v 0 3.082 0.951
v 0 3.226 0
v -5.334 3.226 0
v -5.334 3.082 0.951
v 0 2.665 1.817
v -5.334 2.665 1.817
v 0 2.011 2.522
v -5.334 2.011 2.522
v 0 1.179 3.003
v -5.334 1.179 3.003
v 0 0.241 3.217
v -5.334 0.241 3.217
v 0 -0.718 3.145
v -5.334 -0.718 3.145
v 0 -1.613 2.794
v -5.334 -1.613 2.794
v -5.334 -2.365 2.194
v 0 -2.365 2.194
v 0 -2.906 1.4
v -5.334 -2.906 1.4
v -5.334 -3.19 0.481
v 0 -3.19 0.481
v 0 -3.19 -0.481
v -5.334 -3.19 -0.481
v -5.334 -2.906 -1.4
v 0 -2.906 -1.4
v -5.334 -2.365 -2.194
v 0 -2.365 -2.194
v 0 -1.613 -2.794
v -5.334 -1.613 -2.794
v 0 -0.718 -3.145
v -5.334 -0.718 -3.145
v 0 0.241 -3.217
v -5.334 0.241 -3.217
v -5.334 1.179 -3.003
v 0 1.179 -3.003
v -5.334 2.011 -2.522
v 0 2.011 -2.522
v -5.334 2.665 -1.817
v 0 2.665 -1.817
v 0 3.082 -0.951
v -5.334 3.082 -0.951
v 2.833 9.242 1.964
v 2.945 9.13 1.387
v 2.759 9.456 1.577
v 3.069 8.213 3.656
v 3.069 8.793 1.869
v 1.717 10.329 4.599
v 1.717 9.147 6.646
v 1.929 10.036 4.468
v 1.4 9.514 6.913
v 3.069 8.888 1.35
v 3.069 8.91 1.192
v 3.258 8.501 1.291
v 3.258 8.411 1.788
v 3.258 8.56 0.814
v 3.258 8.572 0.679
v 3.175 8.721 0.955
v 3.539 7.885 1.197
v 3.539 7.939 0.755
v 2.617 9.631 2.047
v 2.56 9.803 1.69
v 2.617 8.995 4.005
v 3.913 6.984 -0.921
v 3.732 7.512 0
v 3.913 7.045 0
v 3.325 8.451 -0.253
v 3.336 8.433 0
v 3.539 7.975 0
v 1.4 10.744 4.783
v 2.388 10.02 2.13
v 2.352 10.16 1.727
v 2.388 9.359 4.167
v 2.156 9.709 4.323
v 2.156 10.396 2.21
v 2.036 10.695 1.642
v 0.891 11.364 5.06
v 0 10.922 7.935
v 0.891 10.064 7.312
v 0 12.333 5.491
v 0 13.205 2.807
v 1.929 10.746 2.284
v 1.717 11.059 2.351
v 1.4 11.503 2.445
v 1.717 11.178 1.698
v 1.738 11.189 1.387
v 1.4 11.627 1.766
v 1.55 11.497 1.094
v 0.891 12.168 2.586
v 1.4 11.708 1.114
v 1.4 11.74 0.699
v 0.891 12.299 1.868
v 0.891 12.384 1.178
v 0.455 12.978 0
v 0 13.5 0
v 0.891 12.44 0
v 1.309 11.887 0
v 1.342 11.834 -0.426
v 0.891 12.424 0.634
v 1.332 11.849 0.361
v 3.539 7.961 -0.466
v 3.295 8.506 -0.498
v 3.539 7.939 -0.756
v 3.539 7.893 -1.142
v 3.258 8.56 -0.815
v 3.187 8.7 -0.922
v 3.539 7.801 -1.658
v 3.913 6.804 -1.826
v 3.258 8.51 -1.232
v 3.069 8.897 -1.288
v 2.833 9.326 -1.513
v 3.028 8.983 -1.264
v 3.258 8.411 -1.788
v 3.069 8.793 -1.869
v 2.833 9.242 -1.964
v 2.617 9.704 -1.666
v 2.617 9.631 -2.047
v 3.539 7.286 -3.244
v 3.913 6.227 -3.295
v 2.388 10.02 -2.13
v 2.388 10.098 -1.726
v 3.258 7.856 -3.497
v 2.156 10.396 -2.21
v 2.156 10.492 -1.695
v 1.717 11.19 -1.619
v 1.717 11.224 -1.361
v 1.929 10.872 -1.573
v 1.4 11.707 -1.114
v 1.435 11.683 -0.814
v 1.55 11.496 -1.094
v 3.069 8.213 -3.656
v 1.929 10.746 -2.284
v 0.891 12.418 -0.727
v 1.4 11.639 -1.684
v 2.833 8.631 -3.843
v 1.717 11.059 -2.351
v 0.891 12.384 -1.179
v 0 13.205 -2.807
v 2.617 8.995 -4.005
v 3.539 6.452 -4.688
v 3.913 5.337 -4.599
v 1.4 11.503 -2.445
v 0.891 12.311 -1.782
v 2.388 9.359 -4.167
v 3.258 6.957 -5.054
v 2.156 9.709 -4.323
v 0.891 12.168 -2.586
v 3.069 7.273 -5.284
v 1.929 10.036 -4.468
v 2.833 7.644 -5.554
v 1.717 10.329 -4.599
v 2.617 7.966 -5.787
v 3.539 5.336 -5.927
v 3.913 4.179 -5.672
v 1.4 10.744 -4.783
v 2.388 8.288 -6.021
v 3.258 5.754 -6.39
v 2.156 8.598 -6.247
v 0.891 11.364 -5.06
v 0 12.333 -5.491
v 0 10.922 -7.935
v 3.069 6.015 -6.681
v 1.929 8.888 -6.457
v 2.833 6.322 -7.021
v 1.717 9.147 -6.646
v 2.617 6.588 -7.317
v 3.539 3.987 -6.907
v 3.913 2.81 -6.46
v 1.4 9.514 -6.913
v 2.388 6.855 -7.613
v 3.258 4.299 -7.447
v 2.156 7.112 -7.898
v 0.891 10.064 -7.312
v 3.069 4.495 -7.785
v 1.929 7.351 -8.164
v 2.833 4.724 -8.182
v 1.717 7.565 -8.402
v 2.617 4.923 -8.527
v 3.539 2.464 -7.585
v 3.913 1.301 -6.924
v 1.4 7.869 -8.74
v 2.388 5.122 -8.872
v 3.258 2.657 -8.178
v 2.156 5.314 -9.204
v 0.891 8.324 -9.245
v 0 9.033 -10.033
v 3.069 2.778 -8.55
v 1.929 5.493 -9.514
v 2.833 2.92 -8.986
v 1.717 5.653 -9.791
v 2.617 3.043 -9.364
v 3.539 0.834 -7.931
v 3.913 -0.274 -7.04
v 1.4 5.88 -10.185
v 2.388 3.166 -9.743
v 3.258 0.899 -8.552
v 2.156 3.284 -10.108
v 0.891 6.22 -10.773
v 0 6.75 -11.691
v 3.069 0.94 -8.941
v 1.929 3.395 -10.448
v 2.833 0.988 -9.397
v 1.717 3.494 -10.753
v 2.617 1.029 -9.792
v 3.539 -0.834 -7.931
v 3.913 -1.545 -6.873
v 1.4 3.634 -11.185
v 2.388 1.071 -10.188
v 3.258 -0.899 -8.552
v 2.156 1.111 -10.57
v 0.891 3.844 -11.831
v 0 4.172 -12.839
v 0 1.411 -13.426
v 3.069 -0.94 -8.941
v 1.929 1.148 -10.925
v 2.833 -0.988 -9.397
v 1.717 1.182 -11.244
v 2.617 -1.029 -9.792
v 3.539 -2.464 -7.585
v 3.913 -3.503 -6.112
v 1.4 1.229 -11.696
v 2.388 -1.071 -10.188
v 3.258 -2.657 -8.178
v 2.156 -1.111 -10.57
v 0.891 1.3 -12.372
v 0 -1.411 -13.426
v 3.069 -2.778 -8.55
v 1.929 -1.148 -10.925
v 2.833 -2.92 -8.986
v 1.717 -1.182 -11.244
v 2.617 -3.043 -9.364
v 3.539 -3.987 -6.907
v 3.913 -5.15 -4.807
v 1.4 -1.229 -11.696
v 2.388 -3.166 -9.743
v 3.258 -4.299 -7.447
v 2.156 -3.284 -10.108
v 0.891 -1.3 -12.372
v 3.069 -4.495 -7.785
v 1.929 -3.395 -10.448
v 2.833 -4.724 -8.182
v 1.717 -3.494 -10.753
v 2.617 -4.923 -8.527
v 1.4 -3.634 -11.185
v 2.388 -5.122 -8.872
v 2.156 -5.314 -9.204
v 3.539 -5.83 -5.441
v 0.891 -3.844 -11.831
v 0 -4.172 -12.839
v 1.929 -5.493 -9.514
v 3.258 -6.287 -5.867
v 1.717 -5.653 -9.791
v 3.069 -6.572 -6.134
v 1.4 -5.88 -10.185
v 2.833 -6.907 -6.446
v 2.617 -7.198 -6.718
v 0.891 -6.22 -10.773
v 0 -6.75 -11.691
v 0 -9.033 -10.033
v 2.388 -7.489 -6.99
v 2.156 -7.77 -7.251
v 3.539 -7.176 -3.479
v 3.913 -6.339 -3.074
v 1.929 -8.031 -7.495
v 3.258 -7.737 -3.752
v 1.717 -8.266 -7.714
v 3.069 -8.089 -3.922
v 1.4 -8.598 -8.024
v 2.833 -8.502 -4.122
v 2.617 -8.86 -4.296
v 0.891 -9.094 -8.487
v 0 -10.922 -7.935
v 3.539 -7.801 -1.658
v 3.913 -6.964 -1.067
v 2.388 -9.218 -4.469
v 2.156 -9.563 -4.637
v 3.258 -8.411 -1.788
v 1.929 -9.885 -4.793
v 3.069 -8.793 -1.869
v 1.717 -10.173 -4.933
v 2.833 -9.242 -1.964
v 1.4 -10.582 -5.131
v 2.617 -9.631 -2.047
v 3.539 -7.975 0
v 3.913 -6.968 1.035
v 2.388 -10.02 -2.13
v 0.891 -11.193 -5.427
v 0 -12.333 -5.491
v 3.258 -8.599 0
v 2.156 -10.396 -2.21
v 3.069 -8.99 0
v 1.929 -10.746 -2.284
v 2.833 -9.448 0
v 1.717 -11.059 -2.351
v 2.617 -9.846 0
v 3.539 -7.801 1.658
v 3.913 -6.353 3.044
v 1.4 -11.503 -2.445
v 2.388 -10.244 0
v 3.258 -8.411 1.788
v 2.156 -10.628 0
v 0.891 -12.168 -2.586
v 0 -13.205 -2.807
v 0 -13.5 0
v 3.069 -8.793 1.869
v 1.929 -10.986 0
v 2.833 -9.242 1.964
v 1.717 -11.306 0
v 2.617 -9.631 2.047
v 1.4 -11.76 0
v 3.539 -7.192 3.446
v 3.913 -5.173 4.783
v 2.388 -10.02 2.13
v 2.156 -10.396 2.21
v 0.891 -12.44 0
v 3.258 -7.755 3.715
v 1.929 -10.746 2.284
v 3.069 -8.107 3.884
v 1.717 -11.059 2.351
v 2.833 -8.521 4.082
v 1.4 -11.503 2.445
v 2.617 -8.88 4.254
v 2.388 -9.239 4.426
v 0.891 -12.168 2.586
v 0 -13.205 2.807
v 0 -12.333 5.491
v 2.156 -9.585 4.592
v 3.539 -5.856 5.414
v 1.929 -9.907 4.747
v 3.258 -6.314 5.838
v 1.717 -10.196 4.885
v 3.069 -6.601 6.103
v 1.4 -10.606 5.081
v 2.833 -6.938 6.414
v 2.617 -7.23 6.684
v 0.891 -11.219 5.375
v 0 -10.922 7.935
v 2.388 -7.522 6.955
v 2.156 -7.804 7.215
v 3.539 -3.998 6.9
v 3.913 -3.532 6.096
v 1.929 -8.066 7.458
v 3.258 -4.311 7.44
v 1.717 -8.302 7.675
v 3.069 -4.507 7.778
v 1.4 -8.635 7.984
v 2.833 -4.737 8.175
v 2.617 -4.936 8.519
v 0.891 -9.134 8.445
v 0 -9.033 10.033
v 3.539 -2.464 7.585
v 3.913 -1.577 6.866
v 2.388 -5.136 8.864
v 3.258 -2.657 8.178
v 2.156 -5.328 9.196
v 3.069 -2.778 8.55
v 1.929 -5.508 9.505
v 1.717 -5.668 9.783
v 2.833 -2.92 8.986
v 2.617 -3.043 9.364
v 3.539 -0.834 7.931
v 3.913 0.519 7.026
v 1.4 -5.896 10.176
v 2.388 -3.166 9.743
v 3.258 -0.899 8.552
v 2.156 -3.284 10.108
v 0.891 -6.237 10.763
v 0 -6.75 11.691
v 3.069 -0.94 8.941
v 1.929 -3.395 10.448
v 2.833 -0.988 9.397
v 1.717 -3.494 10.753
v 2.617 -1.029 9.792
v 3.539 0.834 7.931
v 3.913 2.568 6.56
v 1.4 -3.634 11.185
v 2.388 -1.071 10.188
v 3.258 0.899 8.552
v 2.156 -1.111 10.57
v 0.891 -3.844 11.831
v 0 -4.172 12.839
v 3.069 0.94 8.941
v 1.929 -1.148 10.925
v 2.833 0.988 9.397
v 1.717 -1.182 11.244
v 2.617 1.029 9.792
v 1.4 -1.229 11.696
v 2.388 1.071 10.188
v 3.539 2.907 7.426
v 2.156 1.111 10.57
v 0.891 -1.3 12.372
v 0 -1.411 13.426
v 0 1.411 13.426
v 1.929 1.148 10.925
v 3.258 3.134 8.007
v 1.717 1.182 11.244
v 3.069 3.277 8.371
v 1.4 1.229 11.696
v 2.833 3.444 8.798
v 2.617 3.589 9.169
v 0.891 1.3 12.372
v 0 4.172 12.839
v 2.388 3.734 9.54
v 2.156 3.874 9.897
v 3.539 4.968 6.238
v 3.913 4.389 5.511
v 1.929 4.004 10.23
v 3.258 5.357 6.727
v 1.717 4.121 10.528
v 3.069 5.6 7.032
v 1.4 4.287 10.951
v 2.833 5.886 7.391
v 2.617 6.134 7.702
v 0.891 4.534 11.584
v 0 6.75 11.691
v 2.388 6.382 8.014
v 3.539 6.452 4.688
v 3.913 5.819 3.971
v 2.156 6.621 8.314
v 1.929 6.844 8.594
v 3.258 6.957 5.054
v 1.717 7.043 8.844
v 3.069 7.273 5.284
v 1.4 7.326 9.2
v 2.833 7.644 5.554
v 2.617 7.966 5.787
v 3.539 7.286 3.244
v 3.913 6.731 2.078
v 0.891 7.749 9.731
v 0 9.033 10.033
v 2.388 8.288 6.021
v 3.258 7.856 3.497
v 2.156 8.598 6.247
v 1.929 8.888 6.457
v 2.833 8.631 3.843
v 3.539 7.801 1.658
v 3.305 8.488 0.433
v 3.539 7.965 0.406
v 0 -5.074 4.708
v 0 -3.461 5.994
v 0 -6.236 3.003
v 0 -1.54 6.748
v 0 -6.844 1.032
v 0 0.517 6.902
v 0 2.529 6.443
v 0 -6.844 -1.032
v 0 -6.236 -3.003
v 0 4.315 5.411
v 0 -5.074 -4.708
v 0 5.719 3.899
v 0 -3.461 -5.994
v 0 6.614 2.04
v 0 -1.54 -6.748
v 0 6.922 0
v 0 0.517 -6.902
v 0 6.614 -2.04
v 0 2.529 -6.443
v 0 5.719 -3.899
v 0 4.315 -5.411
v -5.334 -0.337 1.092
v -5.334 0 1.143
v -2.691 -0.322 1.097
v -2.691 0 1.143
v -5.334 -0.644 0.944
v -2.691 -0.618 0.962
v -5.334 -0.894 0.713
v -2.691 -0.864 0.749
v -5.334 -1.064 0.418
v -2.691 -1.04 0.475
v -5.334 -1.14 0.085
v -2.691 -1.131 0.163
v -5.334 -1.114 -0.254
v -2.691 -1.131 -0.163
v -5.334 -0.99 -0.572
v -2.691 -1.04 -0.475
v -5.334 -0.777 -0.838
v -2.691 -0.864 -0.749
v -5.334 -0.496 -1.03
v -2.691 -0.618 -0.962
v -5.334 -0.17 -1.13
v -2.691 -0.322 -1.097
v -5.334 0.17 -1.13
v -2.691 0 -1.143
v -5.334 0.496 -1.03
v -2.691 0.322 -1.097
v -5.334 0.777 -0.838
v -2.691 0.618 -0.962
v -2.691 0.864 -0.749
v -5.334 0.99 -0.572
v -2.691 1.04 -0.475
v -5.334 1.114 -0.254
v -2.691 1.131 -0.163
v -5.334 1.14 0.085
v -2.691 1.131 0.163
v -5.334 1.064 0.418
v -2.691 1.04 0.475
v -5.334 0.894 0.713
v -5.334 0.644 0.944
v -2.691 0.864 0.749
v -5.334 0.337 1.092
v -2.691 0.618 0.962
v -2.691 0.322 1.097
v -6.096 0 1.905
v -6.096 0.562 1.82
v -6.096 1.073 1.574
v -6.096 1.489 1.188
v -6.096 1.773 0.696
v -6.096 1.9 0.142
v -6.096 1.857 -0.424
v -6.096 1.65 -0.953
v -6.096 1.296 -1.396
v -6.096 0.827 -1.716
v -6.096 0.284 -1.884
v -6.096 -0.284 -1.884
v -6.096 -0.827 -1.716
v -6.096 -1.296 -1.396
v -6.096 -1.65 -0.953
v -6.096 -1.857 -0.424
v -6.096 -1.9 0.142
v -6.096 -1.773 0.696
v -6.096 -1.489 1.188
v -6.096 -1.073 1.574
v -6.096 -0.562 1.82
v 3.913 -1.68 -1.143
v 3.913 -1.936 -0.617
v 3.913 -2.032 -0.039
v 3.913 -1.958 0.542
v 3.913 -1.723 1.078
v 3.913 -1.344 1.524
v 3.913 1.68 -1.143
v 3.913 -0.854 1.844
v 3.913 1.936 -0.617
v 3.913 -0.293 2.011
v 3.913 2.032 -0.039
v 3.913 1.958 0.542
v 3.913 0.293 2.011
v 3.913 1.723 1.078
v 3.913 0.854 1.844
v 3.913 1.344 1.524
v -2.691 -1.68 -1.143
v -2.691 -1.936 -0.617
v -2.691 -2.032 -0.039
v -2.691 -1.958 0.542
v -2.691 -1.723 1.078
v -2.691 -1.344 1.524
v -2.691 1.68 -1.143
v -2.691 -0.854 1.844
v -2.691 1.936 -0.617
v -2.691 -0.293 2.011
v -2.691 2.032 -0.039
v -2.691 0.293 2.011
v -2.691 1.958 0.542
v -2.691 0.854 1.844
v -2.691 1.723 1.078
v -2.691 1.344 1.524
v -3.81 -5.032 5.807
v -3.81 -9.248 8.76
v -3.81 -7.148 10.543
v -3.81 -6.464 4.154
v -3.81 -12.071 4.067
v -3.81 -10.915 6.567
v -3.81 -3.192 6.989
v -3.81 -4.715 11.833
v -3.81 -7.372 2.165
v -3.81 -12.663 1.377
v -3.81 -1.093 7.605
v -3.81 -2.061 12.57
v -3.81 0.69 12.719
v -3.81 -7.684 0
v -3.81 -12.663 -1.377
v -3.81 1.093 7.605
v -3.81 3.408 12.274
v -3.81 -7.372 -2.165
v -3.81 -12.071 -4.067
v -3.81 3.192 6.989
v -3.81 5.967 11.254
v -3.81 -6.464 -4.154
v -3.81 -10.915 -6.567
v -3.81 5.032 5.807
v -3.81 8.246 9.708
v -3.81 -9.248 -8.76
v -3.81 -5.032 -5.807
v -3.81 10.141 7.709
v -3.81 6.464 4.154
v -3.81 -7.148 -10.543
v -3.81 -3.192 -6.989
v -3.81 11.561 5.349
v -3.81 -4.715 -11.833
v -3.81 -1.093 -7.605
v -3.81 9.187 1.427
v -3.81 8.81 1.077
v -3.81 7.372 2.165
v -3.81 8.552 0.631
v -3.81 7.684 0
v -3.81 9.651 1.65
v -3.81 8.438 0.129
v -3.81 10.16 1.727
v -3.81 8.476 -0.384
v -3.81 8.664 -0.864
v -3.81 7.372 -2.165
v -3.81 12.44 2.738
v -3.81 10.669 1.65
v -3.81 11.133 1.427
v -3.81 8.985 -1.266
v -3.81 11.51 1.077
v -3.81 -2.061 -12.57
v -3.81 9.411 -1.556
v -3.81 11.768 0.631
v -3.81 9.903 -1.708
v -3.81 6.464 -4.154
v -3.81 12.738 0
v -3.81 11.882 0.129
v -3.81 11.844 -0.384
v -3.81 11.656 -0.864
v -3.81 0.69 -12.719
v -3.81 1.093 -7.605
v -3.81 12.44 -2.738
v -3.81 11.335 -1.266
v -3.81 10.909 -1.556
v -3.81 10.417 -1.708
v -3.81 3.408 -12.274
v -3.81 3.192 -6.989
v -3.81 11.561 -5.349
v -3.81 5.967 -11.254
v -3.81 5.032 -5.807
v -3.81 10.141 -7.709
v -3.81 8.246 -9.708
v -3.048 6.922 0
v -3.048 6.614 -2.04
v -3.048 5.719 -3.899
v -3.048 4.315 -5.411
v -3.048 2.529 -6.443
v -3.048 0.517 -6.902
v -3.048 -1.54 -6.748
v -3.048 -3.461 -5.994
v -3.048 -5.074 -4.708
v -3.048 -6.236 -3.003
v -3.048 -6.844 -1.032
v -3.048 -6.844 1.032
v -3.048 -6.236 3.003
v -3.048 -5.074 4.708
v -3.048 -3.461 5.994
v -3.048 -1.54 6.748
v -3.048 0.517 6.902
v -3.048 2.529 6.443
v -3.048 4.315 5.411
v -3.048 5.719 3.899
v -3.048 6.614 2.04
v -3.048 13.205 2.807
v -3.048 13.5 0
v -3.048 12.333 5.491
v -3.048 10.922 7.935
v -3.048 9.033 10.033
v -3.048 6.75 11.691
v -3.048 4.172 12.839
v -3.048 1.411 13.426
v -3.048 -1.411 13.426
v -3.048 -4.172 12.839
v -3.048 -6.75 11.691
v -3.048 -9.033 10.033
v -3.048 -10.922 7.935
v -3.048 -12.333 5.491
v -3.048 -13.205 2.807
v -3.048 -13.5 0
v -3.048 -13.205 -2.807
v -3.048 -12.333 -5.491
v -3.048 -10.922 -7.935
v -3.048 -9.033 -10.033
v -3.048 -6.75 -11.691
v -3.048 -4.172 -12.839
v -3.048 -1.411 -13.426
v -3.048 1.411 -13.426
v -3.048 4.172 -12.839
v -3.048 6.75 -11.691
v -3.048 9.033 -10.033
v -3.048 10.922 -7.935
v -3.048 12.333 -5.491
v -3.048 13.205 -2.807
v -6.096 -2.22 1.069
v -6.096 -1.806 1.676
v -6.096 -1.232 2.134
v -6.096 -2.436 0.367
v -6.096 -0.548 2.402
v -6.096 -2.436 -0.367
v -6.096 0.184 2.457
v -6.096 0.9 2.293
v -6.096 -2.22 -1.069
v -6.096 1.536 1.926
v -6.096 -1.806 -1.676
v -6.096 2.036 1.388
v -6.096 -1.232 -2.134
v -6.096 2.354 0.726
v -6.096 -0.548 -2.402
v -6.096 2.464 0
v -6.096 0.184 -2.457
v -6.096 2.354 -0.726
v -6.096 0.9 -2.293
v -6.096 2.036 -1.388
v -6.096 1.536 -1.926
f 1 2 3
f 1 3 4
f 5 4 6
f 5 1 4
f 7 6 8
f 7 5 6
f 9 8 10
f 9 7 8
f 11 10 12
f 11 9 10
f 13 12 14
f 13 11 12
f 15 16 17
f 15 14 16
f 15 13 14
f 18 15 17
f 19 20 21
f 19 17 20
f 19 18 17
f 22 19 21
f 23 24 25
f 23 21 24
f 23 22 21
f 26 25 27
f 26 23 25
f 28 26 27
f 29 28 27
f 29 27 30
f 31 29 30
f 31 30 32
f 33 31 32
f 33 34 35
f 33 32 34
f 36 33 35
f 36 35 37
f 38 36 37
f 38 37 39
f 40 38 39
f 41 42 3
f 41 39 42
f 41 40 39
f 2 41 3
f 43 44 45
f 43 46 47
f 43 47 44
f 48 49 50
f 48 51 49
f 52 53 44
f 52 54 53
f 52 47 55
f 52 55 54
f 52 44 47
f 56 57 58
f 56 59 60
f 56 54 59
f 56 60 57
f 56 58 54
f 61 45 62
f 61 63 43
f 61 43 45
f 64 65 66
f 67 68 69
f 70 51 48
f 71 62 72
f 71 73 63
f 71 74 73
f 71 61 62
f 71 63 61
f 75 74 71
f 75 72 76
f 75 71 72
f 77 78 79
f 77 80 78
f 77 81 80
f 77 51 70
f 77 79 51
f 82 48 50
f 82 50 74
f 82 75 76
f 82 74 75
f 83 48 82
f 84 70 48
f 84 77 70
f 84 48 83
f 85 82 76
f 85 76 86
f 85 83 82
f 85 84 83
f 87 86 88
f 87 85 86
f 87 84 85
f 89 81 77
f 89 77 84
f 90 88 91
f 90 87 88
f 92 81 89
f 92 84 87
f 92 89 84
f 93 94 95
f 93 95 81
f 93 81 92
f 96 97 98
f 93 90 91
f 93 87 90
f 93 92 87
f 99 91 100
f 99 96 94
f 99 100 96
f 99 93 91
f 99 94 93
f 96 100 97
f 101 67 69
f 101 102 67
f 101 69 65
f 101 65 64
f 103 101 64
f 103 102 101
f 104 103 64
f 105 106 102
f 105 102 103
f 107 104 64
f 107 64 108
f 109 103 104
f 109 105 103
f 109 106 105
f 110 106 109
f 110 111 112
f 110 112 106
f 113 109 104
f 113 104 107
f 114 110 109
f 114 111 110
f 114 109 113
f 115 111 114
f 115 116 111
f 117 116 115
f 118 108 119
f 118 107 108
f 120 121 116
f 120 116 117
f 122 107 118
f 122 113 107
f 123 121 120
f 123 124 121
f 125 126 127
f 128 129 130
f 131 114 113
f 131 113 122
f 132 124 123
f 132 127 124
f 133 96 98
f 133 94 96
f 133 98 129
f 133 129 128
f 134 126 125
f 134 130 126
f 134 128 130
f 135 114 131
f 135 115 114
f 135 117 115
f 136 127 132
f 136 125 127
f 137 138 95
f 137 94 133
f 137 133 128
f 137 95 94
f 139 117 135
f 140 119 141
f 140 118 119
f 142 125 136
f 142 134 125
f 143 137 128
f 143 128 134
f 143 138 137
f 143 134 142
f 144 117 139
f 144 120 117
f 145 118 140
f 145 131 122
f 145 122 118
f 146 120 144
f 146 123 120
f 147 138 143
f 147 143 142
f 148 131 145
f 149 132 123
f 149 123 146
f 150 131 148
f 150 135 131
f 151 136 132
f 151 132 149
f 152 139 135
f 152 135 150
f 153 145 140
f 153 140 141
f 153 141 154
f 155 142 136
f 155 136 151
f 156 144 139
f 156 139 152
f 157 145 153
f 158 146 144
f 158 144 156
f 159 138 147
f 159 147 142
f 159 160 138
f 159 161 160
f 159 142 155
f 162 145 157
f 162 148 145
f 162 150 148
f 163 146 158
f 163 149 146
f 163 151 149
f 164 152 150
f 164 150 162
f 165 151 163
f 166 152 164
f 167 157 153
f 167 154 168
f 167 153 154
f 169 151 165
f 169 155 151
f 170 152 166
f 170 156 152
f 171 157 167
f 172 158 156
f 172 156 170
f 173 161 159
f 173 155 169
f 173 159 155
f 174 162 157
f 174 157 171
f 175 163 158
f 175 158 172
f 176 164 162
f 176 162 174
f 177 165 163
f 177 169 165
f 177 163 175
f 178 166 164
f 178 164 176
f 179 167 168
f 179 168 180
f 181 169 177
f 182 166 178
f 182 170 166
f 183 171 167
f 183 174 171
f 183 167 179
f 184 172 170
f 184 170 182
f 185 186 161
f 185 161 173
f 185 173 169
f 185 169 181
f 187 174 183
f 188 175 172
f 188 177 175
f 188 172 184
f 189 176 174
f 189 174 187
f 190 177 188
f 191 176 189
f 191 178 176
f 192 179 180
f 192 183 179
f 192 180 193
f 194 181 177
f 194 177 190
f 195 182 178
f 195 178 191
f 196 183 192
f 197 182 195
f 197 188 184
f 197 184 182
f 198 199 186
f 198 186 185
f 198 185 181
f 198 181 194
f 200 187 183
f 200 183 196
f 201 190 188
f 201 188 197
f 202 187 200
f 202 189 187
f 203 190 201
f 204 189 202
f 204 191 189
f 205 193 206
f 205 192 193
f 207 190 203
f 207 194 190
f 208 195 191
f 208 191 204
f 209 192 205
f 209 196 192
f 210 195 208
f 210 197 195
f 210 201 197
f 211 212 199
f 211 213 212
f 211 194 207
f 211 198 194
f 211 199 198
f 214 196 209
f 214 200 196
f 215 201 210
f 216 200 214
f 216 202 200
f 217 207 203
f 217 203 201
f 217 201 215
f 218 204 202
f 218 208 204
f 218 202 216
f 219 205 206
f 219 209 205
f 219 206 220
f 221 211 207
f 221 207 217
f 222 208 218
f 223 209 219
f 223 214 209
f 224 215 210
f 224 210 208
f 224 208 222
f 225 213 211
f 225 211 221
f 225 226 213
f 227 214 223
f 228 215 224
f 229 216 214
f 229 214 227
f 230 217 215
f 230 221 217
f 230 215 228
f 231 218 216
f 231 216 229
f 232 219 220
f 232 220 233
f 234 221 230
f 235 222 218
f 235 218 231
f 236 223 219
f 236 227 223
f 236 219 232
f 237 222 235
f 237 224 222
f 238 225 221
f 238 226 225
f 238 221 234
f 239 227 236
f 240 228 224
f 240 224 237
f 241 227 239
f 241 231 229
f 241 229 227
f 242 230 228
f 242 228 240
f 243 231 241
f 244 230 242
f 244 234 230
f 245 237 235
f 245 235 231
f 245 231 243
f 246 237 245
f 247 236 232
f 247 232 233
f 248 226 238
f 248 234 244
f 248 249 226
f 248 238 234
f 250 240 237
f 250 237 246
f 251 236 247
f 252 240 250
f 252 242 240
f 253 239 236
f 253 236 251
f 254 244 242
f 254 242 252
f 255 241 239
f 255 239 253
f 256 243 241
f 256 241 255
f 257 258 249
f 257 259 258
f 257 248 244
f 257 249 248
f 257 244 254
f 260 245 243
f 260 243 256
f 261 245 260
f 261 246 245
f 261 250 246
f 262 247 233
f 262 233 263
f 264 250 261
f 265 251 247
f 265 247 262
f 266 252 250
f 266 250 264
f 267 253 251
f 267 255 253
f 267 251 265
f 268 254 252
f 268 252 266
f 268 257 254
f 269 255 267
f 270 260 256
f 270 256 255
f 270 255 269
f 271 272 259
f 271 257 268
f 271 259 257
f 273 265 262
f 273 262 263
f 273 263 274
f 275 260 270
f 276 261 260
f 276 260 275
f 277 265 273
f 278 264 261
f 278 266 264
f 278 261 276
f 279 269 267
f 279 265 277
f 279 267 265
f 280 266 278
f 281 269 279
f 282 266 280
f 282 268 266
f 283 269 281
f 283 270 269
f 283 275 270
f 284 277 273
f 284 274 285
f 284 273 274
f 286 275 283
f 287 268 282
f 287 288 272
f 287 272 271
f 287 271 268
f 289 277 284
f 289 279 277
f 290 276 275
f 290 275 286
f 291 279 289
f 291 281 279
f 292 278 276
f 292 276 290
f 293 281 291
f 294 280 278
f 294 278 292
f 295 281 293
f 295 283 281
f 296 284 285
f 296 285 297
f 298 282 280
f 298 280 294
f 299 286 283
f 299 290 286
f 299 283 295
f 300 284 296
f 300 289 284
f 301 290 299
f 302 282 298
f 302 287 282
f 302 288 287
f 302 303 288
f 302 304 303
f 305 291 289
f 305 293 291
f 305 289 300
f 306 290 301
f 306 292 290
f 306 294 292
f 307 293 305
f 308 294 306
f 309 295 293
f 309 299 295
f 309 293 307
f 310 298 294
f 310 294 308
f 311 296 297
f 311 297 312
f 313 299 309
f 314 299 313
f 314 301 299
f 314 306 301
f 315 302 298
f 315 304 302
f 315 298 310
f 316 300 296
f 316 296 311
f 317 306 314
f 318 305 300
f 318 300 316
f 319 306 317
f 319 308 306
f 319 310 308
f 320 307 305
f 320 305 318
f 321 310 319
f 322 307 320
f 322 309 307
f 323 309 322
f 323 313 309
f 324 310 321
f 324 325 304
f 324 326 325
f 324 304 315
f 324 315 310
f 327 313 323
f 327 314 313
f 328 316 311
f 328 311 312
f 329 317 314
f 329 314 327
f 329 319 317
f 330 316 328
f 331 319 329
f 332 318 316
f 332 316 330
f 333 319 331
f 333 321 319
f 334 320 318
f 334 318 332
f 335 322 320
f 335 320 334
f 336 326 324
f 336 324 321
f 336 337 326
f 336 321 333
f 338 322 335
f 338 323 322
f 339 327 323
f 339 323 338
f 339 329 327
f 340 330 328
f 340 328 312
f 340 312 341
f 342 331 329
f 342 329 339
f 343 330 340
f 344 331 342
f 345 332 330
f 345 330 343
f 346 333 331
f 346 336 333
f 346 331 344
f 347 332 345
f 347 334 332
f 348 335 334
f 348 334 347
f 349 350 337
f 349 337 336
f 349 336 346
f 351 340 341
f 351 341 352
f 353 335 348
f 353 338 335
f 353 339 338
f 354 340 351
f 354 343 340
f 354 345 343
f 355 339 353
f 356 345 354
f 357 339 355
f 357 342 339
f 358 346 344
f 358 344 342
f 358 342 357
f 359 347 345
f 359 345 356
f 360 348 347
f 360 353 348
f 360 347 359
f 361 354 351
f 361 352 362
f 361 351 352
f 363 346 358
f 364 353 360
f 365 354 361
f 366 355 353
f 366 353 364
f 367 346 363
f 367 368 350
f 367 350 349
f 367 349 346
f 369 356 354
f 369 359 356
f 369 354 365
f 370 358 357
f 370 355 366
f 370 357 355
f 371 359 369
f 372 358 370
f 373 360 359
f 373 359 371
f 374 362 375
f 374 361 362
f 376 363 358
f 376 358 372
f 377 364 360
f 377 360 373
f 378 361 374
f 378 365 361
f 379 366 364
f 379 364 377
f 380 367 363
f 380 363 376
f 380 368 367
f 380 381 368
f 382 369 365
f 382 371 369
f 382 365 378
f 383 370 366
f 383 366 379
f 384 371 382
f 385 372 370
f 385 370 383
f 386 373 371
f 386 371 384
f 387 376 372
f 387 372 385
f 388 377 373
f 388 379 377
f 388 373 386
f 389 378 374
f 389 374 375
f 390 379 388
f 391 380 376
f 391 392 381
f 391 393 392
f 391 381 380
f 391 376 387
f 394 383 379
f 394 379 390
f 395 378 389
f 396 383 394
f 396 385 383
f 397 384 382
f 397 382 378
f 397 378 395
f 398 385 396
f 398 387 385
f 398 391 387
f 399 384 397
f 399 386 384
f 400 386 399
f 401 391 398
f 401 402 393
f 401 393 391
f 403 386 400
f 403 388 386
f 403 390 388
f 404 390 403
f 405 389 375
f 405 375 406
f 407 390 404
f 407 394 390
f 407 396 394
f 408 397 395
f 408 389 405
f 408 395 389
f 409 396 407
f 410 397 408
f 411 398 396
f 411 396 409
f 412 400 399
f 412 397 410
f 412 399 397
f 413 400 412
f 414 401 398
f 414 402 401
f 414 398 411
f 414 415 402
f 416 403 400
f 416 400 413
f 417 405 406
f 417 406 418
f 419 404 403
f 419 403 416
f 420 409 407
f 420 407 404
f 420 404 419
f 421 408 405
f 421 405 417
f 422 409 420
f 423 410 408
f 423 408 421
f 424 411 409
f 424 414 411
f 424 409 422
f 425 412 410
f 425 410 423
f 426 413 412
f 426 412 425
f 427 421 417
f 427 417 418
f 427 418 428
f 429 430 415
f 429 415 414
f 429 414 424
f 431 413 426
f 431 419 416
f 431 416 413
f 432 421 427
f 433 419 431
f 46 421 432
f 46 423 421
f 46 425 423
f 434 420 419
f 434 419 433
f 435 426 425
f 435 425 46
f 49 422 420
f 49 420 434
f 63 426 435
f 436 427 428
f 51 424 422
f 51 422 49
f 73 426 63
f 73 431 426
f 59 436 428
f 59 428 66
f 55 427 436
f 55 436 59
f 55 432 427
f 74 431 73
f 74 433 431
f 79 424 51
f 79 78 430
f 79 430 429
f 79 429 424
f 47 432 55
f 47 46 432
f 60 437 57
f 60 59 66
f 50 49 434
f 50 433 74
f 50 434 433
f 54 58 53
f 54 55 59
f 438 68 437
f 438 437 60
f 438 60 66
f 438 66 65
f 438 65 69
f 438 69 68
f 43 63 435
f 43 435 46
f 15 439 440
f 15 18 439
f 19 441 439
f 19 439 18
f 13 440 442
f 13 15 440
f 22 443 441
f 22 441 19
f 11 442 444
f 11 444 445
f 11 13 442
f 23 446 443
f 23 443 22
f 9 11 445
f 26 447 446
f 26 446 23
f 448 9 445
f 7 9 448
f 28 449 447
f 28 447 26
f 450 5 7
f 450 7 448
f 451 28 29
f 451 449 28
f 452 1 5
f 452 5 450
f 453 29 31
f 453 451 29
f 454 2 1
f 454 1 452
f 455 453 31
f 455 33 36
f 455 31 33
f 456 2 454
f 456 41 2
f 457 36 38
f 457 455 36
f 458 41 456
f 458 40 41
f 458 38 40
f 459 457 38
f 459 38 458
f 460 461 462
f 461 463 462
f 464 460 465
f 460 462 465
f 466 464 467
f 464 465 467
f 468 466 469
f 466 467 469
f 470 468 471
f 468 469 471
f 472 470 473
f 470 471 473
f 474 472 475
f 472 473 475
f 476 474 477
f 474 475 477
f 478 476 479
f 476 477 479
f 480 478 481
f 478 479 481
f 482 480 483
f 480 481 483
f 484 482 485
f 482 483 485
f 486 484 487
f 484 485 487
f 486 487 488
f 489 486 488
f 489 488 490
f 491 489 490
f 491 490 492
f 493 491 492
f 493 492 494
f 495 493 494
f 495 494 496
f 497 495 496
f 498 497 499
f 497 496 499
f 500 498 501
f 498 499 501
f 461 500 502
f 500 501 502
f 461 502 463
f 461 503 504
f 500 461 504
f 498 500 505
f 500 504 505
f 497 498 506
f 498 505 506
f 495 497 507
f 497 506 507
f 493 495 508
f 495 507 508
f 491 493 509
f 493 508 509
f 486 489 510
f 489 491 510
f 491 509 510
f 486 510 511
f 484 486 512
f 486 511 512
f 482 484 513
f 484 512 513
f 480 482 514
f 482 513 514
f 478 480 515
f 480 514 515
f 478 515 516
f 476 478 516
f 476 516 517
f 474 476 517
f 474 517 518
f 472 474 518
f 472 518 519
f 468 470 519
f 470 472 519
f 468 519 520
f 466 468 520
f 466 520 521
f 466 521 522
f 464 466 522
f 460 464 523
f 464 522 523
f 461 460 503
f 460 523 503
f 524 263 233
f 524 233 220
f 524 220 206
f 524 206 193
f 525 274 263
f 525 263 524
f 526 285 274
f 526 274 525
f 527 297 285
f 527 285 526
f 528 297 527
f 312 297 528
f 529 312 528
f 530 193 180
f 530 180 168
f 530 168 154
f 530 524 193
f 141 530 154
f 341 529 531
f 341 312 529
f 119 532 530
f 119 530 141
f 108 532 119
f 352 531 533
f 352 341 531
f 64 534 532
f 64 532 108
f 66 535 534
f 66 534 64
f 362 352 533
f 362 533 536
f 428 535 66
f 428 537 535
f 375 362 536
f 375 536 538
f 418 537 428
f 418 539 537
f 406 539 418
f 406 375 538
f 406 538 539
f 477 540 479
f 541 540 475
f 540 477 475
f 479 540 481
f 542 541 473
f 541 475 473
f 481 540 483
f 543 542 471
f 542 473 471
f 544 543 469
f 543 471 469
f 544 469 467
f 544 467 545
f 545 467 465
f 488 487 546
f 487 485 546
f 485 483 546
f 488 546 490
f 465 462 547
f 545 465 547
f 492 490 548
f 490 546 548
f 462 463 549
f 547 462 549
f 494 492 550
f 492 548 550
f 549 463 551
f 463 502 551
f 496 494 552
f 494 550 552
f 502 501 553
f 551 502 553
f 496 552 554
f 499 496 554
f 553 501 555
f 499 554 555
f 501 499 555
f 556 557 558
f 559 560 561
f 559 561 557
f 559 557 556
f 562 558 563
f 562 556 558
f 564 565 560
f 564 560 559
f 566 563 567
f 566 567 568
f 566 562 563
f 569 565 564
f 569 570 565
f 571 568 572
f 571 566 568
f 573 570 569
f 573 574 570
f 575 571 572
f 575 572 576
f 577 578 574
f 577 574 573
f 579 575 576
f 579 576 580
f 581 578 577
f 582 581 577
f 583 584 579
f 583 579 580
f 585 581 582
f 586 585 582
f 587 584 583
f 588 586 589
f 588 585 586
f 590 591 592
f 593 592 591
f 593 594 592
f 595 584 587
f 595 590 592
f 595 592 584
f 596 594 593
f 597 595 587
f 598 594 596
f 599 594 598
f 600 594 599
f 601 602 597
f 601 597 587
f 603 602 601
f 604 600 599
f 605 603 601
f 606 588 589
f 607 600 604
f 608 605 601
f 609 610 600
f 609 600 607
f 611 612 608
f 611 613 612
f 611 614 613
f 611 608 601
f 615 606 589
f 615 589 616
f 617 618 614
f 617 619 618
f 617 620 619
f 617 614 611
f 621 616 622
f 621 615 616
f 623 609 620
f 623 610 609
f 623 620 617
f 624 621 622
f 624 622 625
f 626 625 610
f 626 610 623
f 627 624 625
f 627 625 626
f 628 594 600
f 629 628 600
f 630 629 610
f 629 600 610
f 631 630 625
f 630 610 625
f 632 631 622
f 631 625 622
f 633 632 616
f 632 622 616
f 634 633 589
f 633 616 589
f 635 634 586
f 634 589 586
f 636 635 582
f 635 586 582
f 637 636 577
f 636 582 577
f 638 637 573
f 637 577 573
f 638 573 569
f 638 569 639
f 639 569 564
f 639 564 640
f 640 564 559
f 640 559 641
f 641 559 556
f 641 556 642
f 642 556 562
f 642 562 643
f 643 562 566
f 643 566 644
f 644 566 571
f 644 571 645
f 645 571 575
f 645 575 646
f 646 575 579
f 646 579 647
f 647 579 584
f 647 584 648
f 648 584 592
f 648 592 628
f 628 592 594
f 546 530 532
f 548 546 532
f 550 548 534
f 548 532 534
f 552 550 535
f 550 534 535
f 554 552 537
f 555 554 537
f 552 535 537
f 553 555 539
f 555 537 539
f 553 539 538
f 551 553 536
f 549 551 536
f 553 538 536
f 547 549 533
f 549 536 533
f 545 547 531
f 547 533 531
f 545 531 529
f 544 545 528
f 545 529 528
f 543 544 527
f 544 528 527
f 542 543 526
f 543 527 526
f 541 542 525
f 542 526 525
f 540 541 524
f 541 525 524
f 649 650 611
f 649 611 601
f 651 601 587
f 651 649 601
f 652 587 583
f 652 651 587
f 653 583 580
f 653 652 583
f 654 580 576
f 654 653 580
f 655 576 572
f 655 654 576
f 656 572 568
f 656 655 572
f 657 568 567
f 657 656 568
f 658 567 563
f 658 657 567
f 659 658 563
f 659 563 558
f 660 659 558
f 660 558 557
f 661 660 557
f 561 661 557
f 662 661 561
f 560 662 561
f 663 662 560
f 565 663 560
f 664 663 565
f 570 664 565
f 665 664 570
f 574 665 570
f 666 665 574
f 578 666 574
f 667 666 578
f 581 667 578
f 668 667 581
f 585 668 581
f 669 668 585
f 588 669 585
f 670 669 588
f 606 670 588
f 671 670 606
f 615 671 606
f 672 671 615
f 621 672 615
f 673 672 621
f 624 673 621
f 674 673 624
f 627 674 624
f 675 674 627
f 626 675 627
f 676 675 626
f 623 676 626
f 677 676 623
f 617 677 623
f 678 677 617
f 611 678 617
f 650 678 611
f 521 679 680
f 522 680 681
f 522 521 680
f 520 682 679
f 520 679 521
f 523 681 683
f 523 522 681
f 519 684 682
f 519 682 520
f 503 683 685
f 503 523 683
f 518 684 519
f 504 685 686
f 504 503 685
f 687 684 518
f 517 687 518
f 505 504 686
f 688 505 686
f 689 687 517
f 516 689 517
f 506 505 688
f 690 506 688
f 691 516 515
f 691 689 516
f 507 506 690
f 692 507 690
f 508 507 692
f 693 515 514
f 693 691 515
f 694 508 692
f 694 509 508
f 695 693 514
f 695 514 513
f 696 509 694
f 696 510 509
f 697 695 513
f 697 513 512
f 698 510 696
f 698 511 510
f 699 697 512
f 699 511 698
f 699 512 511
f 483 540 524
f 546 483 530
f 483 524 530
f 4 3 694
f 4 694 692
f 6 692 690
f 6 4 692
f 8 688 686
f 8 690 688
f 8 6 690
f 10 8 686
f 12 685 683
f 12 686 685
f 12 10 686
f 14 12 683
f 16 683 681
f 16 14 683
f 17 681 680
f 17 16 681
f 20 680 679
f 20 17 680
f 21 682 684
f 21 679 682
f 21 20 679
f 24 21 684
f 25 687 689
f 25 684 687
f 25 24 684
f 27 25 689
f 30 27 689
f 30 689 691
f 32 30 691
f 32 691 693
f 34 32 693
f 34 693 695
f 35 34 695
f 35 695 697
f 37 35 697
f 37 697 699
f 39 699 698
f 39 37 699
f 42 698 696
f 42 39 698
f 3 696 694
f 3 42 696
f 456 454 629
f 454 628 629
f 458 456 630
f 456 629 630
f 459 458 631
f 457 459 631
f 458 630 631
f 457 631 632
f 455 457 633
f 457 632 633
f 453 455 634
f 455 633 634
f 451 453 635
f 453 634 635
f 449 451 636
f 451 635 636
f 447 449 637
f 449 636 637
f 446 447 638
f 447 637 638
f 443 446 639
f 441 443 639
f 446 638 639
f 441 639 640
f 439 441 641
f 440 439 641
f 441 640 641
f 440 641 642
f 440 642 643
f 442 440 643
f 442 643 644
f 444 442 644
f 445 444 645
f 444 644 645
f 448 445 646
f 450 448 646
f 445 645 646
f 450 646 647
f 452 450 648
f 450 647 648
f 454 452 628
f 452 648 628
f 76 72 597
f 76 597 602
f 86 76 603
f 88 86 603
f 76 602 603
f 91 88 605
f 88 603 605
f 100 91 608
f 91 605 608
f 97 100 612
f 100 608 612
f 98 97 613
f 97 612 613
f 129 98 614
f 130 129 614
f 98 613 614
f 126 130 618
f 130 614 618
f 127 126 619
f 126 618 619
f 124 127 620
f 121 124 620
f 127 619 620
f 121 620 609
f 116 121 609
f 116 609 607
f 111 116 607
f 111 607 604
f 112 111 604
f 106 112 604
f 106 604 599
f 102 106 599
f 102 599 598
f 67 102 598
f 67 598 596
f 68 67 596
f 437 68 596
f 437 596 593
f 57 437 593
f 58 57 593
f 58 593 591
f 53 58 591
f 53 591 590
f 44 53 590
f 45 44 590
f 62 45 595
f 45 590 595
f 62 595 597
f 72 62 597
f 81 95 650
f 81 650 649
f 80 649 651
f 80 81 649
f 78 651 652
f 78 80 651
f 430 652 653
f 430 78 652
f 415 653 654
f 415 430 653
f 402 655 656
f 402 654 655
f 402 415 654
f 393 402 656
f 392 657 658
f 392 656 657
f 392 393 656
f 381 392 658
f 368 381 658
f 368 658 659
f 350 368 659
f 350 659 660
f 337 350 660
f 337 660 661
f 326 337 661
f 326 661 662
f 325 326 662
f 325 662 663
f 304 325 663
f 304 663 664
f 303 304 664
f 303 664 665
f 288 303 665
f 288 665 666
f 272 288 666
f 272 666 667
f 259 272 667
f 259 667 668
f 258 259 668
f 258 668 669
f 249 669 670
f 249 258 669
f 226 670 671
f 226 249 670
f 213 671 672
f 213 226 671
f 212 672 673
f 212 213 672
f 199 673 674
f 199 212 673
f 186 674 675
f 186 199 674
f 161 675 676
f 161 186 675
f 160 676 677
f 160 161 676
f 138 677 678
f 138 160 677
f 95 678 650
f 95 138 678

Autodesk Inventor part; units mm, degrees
ref_plane "XZ Plane" through (0, 0, 0) normal (0, 1, 0) x (-1, 0, 0)
ref_plane "XY Plane" through (0, 0, 0) normal (0, 0, 1) x (1, 0, 0)
sketch "Sketch1" plane through (0, 0, 0) normal (0, 0, 1) x (1, 0, 0)
  line L0 (0, 0) -> (-8.052, 0) construction
  line L1 (-6.096, 2.032) -> (5.08, 2.032)
  line L2 (-6.096, 2.032) -> (-6.096, 3.2258)
  line L3 (-6.096, 3.2258) -> (0, 3.2258)
  line L4 (0, 3.2258) -> (0, 6.9215)
  line L5 (0, 6.9215) -> (-3.81, 6.9215)
  line L6 (-3.81, 6.9215) -> (-3.81, 13.5001)
  line L7 (-3.81, 13.5001) -> (0, 13.5001)
  arc A0 (5.08, 2.032) -> (0, 13.5001) centre (-14.9919, 0) ccw
  dimension "d0" = 2.032
  dimension "d1" = 13.5001
  dimension "d2" = 6.096
  dimension "d3" = 3.2258
  dimension "d4" = 3.81
  dimension "d5" = 6.9215
  dimension "d7" = 5.08
revolve "Revolution1" add sketch "Sketch1" angle 360 about axis through (0, 0, 0) along (-1, 0, 0)
ref_plane "Work Plane3" through (3.9126, 0, 0) normal (1, 0, 0) x (0, 1, 0)
ref_plane "Work Plane2" through (5.1826, 0, 0) normal (1, 0, 0) x (0, 1, 0)
sketch "Sketch2" plane through (3.9126, 0, 0) normal (1, 0, 0) x (0, 1, 0)
  circle A0 centre (0, 0) radius 2.032 projected
  line L0 (-1.6801, -1.143) -> (1.6801, -1.143)
  dimension "d10" = 3.175
extrude "Extrusion1" add sketch "Sketch2" against normal blind 6.604 contours L0 A0 picked at (-0.4517, -1.2667)
sketch "Sketch3" plane through (-2.6914, 0, 0) normal (-1, 0, 0) x (0, 0, 1)
  arc A0 (-1.143, 1.6801) -> (-1.143, -1.6801) centre (0, 0) ccw projected
  line L0 (-1.143, -1.6801) -> (-1.143, 1.6801) projected
  circle A1 centre (0, 0) radius 1.143
  circle A2 centre (0, 0) radius 2.032 projected
  dimension "d13" = 2.286
extrude "Extrusion2" add sketch "Sketch3" along normal up to surface (3.4046 mm away)
sketch "Sketch4" plane through (-3.81, 0, 0) normal (-1, 0, 0) x (0, 0, 1)
  circle A0 centre (0, 10.16) radius 1.7272 projected
extrude "Extrusion3" cut sketch "Sketch4" against normal through all
chamfer "Chamfer1" distance 0.762 angle 45 4 edges at (-3.81, -13.5001, 0) (-3.81, -6.9215, 0) (-6.096, -3.2258, 0) (-6.096, 0, -1.143)
sketch "Sketch5" plane through (3.9126, 0, 0) normal (1, 0, 0) x (0, 1, 0)
  circle A0 centre (0, 0) radius 22.931
extrude "Extrusion4" cut sketch "Sketch5" along normal blind 25.4
properties part number "Flexiwheel Hub - Motor Side"
